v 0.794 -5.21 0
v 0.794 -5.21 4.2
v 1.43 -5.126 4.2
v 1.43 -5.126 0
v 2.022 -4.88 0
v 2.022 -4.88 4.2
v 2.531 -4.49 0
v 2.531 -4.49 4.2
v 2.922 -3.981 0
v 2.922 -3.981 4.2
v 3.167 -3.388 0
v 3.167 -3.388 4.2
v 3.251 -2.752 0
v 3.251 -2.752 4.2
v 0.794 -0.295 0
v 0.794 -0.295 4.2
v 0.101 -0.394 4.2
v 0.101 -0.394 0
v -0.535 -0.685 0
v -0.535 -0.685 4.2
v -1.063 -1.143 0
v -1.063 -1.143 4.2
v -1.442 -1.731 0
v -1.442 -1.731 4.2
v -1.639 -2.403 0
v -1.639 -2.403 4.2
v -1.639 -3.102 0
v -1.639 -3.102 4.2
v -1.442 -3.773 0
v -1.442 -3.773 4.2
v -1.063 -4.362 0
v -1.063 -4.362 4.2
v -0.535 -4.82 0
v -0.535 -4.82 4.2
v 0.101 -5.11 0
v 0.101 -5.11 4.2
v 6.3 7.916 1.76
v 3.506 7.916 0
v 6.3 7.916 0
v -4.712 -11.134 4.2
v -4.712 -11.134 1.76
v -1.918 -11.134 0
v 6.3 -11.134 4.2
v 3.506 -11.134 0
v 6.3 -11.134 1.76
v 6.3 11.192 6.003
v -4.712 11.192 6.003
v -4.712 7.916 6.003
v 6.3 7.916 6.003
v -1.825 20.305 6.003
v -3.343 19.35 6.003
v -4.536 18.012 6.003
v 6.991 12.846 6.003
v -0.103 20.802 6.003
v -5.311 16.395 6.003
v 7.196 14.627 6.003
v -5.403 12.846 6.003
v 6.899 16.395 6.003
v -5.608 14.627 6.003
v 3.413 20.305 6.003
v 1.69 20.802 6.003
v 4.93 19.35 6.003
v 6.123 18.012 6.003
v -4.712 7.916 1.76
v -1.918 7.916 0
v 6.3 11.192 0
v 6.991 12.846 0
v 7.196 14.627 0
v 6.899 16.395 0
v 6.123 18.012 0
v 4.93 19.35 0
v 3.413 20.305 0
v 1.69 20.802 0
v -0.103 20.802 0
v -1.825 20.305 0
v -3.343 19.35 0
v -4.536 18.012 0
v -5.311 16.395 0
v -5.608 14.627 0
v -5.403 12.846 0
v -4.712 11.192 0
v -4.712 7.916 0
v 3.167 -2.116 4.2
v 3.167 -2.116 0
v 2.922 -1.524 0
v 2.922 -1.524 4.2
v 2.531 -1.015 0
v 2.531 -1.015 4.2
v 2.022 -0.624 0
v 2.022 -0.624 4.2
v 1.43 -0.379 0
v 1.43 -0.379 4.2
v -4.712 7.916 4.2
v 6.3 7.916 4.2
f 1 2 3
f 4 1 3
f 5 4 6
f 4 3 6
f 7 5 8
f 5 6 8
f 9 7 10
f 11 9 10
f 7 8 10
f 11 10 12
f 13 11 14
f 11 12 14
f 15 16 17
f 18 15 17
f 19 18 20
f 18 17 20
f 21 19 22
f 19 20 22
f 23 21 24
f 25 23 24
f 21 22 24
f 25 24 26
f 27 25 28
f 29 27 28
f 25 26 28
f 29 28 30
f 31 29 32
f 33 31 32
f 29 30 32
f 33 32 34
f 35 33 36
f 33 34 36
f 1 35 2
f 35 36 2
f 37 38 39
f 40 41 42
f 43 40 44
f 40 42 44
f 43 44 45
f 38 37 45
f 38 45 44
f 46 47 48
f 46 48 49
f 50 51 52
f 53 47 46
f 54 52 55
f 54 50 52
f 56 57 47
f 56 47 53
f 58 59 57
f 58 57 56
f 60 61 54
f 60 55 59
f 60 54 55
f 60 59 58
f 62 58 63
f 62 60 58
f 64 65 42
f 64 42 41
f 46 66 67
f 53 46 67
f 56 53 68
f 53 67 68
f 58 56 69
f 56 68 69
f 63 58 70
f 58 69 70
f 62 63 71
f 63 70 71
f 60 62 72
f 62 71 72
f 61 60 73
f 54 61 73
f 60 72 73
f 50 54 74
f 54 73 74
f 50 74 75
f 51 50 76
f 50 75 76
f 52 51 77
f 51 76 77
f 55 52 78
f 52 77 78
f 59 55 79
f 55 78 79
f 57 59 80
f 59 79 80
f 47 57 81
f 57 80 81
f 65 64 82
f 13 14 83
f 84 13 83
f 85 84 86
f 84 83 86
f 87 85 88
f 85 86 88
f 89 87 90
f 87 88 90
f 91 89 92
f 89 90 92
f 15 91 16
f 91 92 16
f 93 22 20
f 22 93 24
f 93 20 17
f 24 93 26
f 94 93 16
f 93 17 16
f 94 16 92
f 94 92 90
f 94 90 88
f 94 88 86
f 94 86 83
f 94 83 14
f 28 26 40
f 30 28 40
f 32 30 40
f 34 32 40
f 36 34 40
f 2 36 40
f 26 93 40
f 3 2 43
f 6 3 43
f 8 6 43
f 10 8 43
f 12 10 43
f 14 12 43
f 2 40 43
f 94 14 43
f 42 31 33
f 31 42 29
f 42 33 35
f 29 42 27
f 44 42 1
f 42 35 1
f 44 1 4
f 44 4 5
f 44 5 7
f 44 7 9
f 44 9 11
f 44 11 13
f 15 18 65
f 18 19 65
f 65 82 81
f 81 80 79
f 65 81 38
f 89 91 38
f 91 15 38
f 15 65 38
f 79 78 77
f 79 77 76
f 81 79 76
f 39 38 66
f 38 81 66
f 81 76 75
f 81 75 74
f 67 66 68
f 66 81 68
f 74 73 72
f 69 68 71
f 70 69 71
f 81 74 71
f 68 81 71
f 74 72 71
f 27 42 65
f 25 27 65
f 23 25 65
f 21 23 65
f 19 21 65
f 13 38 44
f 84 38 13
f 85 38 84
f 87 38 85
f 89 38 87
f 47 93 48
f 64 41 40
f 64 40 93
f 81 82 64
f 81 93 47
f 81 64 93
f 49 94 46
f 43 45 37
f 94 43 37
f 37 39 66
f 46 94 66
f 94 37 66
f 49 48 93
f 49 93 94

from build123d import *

# Parameters (mm, degrees)
F0_W     = 11.0125
F0_H     = 22.325812
F1_DEPTH = 6.0034
F3_DEPTH = 6.0034
F4_W     = 5.50625
F4_H     = 1.8034
F5_DEPTH = 19.05
F6_DEPTH = 19.05


with BuildPart() as f1:
    # F0 (on Top) → F1 (new body)
    with BuildSketch(Plane.XY):
        with Locations((0.79375, 0.028664)):
            Rectangle(F0_W, F0_H)
        with BuildLine():
            Line((-4.7125, 11.19157), (6.3, 11.19157))
            ThreePointArc((6.3, 11.19157), (0.79375, 20.865498), (-4.7125, 11.19157))
        make_face()
    extrude(amount=F1_DEPTH)

    # F2 (on face) → F3 (cut, through all)
    with BuildSketch(Plane.XY.offset(6.0034)):
        with BuildLine():
            ThreePointArc((0.79375, -0.294792), (-1.6637, -2.752242), (0.79375, -5.209692))
            Line((0.79375, -5.209692), (0.79375, -0.294792))
        make_face()
        with BuildLine():
            Line((0.79375, -0.294792), (0.79375, -5.209692))
            ThreePointArc((0.79375, -5.209692), (2.53143, -4.489922), (3.2512, -2.752242))
            ThreePointArc((3.2512, -2.752242), (2.53143, -1.014563), (0.79375, -0.294792))
        make_face()
    extrude(amount=-F3_DEPTH, mode=Mode.SUBTRACT)

    # F4 (on face) → F5 (cut)
    with BuildSketch(Plane.XZ.offset(11.134242)):
        Polygon((-1.9185, 0), (-4.7125, 1.76), (-4.7125, 0), align=None)
        Polygon((6.3, 0), (6.3, 1.76), (3.506, 0), align=None)
        with Locations((-1.959375, 5.1017)):
            Rectangle(F4_W, F4_H)
        with Locations((3.546875, 5.1017)):
            Rectangle(F4_W, F4_H)
    extrude(amount=-F5_DEPTH, mode=Mode.SUBTRACT)

    # F4 (on face) → F6 (cut)
    with BuildSketch(Plane.XZ.offset(11.134242)):
        Polygon((-1.9185, 0), (-4.7125, 1.76), (-4.7125, 0), align=None)
        Polygon((6.3, 0), (6.3, 1.76), (3.506, 0), align=None)
        with Locations((-1.959375, 5.1017)):
            Rectangle(F4_W, F4_H)
        with Locations((3.546875, 5.1017)):
            Rectangle(F4_W, F4_H)
    extrude(amount=-F6_DEPTH, mode=Mode.SUBTRACT)


solid = f1.part
